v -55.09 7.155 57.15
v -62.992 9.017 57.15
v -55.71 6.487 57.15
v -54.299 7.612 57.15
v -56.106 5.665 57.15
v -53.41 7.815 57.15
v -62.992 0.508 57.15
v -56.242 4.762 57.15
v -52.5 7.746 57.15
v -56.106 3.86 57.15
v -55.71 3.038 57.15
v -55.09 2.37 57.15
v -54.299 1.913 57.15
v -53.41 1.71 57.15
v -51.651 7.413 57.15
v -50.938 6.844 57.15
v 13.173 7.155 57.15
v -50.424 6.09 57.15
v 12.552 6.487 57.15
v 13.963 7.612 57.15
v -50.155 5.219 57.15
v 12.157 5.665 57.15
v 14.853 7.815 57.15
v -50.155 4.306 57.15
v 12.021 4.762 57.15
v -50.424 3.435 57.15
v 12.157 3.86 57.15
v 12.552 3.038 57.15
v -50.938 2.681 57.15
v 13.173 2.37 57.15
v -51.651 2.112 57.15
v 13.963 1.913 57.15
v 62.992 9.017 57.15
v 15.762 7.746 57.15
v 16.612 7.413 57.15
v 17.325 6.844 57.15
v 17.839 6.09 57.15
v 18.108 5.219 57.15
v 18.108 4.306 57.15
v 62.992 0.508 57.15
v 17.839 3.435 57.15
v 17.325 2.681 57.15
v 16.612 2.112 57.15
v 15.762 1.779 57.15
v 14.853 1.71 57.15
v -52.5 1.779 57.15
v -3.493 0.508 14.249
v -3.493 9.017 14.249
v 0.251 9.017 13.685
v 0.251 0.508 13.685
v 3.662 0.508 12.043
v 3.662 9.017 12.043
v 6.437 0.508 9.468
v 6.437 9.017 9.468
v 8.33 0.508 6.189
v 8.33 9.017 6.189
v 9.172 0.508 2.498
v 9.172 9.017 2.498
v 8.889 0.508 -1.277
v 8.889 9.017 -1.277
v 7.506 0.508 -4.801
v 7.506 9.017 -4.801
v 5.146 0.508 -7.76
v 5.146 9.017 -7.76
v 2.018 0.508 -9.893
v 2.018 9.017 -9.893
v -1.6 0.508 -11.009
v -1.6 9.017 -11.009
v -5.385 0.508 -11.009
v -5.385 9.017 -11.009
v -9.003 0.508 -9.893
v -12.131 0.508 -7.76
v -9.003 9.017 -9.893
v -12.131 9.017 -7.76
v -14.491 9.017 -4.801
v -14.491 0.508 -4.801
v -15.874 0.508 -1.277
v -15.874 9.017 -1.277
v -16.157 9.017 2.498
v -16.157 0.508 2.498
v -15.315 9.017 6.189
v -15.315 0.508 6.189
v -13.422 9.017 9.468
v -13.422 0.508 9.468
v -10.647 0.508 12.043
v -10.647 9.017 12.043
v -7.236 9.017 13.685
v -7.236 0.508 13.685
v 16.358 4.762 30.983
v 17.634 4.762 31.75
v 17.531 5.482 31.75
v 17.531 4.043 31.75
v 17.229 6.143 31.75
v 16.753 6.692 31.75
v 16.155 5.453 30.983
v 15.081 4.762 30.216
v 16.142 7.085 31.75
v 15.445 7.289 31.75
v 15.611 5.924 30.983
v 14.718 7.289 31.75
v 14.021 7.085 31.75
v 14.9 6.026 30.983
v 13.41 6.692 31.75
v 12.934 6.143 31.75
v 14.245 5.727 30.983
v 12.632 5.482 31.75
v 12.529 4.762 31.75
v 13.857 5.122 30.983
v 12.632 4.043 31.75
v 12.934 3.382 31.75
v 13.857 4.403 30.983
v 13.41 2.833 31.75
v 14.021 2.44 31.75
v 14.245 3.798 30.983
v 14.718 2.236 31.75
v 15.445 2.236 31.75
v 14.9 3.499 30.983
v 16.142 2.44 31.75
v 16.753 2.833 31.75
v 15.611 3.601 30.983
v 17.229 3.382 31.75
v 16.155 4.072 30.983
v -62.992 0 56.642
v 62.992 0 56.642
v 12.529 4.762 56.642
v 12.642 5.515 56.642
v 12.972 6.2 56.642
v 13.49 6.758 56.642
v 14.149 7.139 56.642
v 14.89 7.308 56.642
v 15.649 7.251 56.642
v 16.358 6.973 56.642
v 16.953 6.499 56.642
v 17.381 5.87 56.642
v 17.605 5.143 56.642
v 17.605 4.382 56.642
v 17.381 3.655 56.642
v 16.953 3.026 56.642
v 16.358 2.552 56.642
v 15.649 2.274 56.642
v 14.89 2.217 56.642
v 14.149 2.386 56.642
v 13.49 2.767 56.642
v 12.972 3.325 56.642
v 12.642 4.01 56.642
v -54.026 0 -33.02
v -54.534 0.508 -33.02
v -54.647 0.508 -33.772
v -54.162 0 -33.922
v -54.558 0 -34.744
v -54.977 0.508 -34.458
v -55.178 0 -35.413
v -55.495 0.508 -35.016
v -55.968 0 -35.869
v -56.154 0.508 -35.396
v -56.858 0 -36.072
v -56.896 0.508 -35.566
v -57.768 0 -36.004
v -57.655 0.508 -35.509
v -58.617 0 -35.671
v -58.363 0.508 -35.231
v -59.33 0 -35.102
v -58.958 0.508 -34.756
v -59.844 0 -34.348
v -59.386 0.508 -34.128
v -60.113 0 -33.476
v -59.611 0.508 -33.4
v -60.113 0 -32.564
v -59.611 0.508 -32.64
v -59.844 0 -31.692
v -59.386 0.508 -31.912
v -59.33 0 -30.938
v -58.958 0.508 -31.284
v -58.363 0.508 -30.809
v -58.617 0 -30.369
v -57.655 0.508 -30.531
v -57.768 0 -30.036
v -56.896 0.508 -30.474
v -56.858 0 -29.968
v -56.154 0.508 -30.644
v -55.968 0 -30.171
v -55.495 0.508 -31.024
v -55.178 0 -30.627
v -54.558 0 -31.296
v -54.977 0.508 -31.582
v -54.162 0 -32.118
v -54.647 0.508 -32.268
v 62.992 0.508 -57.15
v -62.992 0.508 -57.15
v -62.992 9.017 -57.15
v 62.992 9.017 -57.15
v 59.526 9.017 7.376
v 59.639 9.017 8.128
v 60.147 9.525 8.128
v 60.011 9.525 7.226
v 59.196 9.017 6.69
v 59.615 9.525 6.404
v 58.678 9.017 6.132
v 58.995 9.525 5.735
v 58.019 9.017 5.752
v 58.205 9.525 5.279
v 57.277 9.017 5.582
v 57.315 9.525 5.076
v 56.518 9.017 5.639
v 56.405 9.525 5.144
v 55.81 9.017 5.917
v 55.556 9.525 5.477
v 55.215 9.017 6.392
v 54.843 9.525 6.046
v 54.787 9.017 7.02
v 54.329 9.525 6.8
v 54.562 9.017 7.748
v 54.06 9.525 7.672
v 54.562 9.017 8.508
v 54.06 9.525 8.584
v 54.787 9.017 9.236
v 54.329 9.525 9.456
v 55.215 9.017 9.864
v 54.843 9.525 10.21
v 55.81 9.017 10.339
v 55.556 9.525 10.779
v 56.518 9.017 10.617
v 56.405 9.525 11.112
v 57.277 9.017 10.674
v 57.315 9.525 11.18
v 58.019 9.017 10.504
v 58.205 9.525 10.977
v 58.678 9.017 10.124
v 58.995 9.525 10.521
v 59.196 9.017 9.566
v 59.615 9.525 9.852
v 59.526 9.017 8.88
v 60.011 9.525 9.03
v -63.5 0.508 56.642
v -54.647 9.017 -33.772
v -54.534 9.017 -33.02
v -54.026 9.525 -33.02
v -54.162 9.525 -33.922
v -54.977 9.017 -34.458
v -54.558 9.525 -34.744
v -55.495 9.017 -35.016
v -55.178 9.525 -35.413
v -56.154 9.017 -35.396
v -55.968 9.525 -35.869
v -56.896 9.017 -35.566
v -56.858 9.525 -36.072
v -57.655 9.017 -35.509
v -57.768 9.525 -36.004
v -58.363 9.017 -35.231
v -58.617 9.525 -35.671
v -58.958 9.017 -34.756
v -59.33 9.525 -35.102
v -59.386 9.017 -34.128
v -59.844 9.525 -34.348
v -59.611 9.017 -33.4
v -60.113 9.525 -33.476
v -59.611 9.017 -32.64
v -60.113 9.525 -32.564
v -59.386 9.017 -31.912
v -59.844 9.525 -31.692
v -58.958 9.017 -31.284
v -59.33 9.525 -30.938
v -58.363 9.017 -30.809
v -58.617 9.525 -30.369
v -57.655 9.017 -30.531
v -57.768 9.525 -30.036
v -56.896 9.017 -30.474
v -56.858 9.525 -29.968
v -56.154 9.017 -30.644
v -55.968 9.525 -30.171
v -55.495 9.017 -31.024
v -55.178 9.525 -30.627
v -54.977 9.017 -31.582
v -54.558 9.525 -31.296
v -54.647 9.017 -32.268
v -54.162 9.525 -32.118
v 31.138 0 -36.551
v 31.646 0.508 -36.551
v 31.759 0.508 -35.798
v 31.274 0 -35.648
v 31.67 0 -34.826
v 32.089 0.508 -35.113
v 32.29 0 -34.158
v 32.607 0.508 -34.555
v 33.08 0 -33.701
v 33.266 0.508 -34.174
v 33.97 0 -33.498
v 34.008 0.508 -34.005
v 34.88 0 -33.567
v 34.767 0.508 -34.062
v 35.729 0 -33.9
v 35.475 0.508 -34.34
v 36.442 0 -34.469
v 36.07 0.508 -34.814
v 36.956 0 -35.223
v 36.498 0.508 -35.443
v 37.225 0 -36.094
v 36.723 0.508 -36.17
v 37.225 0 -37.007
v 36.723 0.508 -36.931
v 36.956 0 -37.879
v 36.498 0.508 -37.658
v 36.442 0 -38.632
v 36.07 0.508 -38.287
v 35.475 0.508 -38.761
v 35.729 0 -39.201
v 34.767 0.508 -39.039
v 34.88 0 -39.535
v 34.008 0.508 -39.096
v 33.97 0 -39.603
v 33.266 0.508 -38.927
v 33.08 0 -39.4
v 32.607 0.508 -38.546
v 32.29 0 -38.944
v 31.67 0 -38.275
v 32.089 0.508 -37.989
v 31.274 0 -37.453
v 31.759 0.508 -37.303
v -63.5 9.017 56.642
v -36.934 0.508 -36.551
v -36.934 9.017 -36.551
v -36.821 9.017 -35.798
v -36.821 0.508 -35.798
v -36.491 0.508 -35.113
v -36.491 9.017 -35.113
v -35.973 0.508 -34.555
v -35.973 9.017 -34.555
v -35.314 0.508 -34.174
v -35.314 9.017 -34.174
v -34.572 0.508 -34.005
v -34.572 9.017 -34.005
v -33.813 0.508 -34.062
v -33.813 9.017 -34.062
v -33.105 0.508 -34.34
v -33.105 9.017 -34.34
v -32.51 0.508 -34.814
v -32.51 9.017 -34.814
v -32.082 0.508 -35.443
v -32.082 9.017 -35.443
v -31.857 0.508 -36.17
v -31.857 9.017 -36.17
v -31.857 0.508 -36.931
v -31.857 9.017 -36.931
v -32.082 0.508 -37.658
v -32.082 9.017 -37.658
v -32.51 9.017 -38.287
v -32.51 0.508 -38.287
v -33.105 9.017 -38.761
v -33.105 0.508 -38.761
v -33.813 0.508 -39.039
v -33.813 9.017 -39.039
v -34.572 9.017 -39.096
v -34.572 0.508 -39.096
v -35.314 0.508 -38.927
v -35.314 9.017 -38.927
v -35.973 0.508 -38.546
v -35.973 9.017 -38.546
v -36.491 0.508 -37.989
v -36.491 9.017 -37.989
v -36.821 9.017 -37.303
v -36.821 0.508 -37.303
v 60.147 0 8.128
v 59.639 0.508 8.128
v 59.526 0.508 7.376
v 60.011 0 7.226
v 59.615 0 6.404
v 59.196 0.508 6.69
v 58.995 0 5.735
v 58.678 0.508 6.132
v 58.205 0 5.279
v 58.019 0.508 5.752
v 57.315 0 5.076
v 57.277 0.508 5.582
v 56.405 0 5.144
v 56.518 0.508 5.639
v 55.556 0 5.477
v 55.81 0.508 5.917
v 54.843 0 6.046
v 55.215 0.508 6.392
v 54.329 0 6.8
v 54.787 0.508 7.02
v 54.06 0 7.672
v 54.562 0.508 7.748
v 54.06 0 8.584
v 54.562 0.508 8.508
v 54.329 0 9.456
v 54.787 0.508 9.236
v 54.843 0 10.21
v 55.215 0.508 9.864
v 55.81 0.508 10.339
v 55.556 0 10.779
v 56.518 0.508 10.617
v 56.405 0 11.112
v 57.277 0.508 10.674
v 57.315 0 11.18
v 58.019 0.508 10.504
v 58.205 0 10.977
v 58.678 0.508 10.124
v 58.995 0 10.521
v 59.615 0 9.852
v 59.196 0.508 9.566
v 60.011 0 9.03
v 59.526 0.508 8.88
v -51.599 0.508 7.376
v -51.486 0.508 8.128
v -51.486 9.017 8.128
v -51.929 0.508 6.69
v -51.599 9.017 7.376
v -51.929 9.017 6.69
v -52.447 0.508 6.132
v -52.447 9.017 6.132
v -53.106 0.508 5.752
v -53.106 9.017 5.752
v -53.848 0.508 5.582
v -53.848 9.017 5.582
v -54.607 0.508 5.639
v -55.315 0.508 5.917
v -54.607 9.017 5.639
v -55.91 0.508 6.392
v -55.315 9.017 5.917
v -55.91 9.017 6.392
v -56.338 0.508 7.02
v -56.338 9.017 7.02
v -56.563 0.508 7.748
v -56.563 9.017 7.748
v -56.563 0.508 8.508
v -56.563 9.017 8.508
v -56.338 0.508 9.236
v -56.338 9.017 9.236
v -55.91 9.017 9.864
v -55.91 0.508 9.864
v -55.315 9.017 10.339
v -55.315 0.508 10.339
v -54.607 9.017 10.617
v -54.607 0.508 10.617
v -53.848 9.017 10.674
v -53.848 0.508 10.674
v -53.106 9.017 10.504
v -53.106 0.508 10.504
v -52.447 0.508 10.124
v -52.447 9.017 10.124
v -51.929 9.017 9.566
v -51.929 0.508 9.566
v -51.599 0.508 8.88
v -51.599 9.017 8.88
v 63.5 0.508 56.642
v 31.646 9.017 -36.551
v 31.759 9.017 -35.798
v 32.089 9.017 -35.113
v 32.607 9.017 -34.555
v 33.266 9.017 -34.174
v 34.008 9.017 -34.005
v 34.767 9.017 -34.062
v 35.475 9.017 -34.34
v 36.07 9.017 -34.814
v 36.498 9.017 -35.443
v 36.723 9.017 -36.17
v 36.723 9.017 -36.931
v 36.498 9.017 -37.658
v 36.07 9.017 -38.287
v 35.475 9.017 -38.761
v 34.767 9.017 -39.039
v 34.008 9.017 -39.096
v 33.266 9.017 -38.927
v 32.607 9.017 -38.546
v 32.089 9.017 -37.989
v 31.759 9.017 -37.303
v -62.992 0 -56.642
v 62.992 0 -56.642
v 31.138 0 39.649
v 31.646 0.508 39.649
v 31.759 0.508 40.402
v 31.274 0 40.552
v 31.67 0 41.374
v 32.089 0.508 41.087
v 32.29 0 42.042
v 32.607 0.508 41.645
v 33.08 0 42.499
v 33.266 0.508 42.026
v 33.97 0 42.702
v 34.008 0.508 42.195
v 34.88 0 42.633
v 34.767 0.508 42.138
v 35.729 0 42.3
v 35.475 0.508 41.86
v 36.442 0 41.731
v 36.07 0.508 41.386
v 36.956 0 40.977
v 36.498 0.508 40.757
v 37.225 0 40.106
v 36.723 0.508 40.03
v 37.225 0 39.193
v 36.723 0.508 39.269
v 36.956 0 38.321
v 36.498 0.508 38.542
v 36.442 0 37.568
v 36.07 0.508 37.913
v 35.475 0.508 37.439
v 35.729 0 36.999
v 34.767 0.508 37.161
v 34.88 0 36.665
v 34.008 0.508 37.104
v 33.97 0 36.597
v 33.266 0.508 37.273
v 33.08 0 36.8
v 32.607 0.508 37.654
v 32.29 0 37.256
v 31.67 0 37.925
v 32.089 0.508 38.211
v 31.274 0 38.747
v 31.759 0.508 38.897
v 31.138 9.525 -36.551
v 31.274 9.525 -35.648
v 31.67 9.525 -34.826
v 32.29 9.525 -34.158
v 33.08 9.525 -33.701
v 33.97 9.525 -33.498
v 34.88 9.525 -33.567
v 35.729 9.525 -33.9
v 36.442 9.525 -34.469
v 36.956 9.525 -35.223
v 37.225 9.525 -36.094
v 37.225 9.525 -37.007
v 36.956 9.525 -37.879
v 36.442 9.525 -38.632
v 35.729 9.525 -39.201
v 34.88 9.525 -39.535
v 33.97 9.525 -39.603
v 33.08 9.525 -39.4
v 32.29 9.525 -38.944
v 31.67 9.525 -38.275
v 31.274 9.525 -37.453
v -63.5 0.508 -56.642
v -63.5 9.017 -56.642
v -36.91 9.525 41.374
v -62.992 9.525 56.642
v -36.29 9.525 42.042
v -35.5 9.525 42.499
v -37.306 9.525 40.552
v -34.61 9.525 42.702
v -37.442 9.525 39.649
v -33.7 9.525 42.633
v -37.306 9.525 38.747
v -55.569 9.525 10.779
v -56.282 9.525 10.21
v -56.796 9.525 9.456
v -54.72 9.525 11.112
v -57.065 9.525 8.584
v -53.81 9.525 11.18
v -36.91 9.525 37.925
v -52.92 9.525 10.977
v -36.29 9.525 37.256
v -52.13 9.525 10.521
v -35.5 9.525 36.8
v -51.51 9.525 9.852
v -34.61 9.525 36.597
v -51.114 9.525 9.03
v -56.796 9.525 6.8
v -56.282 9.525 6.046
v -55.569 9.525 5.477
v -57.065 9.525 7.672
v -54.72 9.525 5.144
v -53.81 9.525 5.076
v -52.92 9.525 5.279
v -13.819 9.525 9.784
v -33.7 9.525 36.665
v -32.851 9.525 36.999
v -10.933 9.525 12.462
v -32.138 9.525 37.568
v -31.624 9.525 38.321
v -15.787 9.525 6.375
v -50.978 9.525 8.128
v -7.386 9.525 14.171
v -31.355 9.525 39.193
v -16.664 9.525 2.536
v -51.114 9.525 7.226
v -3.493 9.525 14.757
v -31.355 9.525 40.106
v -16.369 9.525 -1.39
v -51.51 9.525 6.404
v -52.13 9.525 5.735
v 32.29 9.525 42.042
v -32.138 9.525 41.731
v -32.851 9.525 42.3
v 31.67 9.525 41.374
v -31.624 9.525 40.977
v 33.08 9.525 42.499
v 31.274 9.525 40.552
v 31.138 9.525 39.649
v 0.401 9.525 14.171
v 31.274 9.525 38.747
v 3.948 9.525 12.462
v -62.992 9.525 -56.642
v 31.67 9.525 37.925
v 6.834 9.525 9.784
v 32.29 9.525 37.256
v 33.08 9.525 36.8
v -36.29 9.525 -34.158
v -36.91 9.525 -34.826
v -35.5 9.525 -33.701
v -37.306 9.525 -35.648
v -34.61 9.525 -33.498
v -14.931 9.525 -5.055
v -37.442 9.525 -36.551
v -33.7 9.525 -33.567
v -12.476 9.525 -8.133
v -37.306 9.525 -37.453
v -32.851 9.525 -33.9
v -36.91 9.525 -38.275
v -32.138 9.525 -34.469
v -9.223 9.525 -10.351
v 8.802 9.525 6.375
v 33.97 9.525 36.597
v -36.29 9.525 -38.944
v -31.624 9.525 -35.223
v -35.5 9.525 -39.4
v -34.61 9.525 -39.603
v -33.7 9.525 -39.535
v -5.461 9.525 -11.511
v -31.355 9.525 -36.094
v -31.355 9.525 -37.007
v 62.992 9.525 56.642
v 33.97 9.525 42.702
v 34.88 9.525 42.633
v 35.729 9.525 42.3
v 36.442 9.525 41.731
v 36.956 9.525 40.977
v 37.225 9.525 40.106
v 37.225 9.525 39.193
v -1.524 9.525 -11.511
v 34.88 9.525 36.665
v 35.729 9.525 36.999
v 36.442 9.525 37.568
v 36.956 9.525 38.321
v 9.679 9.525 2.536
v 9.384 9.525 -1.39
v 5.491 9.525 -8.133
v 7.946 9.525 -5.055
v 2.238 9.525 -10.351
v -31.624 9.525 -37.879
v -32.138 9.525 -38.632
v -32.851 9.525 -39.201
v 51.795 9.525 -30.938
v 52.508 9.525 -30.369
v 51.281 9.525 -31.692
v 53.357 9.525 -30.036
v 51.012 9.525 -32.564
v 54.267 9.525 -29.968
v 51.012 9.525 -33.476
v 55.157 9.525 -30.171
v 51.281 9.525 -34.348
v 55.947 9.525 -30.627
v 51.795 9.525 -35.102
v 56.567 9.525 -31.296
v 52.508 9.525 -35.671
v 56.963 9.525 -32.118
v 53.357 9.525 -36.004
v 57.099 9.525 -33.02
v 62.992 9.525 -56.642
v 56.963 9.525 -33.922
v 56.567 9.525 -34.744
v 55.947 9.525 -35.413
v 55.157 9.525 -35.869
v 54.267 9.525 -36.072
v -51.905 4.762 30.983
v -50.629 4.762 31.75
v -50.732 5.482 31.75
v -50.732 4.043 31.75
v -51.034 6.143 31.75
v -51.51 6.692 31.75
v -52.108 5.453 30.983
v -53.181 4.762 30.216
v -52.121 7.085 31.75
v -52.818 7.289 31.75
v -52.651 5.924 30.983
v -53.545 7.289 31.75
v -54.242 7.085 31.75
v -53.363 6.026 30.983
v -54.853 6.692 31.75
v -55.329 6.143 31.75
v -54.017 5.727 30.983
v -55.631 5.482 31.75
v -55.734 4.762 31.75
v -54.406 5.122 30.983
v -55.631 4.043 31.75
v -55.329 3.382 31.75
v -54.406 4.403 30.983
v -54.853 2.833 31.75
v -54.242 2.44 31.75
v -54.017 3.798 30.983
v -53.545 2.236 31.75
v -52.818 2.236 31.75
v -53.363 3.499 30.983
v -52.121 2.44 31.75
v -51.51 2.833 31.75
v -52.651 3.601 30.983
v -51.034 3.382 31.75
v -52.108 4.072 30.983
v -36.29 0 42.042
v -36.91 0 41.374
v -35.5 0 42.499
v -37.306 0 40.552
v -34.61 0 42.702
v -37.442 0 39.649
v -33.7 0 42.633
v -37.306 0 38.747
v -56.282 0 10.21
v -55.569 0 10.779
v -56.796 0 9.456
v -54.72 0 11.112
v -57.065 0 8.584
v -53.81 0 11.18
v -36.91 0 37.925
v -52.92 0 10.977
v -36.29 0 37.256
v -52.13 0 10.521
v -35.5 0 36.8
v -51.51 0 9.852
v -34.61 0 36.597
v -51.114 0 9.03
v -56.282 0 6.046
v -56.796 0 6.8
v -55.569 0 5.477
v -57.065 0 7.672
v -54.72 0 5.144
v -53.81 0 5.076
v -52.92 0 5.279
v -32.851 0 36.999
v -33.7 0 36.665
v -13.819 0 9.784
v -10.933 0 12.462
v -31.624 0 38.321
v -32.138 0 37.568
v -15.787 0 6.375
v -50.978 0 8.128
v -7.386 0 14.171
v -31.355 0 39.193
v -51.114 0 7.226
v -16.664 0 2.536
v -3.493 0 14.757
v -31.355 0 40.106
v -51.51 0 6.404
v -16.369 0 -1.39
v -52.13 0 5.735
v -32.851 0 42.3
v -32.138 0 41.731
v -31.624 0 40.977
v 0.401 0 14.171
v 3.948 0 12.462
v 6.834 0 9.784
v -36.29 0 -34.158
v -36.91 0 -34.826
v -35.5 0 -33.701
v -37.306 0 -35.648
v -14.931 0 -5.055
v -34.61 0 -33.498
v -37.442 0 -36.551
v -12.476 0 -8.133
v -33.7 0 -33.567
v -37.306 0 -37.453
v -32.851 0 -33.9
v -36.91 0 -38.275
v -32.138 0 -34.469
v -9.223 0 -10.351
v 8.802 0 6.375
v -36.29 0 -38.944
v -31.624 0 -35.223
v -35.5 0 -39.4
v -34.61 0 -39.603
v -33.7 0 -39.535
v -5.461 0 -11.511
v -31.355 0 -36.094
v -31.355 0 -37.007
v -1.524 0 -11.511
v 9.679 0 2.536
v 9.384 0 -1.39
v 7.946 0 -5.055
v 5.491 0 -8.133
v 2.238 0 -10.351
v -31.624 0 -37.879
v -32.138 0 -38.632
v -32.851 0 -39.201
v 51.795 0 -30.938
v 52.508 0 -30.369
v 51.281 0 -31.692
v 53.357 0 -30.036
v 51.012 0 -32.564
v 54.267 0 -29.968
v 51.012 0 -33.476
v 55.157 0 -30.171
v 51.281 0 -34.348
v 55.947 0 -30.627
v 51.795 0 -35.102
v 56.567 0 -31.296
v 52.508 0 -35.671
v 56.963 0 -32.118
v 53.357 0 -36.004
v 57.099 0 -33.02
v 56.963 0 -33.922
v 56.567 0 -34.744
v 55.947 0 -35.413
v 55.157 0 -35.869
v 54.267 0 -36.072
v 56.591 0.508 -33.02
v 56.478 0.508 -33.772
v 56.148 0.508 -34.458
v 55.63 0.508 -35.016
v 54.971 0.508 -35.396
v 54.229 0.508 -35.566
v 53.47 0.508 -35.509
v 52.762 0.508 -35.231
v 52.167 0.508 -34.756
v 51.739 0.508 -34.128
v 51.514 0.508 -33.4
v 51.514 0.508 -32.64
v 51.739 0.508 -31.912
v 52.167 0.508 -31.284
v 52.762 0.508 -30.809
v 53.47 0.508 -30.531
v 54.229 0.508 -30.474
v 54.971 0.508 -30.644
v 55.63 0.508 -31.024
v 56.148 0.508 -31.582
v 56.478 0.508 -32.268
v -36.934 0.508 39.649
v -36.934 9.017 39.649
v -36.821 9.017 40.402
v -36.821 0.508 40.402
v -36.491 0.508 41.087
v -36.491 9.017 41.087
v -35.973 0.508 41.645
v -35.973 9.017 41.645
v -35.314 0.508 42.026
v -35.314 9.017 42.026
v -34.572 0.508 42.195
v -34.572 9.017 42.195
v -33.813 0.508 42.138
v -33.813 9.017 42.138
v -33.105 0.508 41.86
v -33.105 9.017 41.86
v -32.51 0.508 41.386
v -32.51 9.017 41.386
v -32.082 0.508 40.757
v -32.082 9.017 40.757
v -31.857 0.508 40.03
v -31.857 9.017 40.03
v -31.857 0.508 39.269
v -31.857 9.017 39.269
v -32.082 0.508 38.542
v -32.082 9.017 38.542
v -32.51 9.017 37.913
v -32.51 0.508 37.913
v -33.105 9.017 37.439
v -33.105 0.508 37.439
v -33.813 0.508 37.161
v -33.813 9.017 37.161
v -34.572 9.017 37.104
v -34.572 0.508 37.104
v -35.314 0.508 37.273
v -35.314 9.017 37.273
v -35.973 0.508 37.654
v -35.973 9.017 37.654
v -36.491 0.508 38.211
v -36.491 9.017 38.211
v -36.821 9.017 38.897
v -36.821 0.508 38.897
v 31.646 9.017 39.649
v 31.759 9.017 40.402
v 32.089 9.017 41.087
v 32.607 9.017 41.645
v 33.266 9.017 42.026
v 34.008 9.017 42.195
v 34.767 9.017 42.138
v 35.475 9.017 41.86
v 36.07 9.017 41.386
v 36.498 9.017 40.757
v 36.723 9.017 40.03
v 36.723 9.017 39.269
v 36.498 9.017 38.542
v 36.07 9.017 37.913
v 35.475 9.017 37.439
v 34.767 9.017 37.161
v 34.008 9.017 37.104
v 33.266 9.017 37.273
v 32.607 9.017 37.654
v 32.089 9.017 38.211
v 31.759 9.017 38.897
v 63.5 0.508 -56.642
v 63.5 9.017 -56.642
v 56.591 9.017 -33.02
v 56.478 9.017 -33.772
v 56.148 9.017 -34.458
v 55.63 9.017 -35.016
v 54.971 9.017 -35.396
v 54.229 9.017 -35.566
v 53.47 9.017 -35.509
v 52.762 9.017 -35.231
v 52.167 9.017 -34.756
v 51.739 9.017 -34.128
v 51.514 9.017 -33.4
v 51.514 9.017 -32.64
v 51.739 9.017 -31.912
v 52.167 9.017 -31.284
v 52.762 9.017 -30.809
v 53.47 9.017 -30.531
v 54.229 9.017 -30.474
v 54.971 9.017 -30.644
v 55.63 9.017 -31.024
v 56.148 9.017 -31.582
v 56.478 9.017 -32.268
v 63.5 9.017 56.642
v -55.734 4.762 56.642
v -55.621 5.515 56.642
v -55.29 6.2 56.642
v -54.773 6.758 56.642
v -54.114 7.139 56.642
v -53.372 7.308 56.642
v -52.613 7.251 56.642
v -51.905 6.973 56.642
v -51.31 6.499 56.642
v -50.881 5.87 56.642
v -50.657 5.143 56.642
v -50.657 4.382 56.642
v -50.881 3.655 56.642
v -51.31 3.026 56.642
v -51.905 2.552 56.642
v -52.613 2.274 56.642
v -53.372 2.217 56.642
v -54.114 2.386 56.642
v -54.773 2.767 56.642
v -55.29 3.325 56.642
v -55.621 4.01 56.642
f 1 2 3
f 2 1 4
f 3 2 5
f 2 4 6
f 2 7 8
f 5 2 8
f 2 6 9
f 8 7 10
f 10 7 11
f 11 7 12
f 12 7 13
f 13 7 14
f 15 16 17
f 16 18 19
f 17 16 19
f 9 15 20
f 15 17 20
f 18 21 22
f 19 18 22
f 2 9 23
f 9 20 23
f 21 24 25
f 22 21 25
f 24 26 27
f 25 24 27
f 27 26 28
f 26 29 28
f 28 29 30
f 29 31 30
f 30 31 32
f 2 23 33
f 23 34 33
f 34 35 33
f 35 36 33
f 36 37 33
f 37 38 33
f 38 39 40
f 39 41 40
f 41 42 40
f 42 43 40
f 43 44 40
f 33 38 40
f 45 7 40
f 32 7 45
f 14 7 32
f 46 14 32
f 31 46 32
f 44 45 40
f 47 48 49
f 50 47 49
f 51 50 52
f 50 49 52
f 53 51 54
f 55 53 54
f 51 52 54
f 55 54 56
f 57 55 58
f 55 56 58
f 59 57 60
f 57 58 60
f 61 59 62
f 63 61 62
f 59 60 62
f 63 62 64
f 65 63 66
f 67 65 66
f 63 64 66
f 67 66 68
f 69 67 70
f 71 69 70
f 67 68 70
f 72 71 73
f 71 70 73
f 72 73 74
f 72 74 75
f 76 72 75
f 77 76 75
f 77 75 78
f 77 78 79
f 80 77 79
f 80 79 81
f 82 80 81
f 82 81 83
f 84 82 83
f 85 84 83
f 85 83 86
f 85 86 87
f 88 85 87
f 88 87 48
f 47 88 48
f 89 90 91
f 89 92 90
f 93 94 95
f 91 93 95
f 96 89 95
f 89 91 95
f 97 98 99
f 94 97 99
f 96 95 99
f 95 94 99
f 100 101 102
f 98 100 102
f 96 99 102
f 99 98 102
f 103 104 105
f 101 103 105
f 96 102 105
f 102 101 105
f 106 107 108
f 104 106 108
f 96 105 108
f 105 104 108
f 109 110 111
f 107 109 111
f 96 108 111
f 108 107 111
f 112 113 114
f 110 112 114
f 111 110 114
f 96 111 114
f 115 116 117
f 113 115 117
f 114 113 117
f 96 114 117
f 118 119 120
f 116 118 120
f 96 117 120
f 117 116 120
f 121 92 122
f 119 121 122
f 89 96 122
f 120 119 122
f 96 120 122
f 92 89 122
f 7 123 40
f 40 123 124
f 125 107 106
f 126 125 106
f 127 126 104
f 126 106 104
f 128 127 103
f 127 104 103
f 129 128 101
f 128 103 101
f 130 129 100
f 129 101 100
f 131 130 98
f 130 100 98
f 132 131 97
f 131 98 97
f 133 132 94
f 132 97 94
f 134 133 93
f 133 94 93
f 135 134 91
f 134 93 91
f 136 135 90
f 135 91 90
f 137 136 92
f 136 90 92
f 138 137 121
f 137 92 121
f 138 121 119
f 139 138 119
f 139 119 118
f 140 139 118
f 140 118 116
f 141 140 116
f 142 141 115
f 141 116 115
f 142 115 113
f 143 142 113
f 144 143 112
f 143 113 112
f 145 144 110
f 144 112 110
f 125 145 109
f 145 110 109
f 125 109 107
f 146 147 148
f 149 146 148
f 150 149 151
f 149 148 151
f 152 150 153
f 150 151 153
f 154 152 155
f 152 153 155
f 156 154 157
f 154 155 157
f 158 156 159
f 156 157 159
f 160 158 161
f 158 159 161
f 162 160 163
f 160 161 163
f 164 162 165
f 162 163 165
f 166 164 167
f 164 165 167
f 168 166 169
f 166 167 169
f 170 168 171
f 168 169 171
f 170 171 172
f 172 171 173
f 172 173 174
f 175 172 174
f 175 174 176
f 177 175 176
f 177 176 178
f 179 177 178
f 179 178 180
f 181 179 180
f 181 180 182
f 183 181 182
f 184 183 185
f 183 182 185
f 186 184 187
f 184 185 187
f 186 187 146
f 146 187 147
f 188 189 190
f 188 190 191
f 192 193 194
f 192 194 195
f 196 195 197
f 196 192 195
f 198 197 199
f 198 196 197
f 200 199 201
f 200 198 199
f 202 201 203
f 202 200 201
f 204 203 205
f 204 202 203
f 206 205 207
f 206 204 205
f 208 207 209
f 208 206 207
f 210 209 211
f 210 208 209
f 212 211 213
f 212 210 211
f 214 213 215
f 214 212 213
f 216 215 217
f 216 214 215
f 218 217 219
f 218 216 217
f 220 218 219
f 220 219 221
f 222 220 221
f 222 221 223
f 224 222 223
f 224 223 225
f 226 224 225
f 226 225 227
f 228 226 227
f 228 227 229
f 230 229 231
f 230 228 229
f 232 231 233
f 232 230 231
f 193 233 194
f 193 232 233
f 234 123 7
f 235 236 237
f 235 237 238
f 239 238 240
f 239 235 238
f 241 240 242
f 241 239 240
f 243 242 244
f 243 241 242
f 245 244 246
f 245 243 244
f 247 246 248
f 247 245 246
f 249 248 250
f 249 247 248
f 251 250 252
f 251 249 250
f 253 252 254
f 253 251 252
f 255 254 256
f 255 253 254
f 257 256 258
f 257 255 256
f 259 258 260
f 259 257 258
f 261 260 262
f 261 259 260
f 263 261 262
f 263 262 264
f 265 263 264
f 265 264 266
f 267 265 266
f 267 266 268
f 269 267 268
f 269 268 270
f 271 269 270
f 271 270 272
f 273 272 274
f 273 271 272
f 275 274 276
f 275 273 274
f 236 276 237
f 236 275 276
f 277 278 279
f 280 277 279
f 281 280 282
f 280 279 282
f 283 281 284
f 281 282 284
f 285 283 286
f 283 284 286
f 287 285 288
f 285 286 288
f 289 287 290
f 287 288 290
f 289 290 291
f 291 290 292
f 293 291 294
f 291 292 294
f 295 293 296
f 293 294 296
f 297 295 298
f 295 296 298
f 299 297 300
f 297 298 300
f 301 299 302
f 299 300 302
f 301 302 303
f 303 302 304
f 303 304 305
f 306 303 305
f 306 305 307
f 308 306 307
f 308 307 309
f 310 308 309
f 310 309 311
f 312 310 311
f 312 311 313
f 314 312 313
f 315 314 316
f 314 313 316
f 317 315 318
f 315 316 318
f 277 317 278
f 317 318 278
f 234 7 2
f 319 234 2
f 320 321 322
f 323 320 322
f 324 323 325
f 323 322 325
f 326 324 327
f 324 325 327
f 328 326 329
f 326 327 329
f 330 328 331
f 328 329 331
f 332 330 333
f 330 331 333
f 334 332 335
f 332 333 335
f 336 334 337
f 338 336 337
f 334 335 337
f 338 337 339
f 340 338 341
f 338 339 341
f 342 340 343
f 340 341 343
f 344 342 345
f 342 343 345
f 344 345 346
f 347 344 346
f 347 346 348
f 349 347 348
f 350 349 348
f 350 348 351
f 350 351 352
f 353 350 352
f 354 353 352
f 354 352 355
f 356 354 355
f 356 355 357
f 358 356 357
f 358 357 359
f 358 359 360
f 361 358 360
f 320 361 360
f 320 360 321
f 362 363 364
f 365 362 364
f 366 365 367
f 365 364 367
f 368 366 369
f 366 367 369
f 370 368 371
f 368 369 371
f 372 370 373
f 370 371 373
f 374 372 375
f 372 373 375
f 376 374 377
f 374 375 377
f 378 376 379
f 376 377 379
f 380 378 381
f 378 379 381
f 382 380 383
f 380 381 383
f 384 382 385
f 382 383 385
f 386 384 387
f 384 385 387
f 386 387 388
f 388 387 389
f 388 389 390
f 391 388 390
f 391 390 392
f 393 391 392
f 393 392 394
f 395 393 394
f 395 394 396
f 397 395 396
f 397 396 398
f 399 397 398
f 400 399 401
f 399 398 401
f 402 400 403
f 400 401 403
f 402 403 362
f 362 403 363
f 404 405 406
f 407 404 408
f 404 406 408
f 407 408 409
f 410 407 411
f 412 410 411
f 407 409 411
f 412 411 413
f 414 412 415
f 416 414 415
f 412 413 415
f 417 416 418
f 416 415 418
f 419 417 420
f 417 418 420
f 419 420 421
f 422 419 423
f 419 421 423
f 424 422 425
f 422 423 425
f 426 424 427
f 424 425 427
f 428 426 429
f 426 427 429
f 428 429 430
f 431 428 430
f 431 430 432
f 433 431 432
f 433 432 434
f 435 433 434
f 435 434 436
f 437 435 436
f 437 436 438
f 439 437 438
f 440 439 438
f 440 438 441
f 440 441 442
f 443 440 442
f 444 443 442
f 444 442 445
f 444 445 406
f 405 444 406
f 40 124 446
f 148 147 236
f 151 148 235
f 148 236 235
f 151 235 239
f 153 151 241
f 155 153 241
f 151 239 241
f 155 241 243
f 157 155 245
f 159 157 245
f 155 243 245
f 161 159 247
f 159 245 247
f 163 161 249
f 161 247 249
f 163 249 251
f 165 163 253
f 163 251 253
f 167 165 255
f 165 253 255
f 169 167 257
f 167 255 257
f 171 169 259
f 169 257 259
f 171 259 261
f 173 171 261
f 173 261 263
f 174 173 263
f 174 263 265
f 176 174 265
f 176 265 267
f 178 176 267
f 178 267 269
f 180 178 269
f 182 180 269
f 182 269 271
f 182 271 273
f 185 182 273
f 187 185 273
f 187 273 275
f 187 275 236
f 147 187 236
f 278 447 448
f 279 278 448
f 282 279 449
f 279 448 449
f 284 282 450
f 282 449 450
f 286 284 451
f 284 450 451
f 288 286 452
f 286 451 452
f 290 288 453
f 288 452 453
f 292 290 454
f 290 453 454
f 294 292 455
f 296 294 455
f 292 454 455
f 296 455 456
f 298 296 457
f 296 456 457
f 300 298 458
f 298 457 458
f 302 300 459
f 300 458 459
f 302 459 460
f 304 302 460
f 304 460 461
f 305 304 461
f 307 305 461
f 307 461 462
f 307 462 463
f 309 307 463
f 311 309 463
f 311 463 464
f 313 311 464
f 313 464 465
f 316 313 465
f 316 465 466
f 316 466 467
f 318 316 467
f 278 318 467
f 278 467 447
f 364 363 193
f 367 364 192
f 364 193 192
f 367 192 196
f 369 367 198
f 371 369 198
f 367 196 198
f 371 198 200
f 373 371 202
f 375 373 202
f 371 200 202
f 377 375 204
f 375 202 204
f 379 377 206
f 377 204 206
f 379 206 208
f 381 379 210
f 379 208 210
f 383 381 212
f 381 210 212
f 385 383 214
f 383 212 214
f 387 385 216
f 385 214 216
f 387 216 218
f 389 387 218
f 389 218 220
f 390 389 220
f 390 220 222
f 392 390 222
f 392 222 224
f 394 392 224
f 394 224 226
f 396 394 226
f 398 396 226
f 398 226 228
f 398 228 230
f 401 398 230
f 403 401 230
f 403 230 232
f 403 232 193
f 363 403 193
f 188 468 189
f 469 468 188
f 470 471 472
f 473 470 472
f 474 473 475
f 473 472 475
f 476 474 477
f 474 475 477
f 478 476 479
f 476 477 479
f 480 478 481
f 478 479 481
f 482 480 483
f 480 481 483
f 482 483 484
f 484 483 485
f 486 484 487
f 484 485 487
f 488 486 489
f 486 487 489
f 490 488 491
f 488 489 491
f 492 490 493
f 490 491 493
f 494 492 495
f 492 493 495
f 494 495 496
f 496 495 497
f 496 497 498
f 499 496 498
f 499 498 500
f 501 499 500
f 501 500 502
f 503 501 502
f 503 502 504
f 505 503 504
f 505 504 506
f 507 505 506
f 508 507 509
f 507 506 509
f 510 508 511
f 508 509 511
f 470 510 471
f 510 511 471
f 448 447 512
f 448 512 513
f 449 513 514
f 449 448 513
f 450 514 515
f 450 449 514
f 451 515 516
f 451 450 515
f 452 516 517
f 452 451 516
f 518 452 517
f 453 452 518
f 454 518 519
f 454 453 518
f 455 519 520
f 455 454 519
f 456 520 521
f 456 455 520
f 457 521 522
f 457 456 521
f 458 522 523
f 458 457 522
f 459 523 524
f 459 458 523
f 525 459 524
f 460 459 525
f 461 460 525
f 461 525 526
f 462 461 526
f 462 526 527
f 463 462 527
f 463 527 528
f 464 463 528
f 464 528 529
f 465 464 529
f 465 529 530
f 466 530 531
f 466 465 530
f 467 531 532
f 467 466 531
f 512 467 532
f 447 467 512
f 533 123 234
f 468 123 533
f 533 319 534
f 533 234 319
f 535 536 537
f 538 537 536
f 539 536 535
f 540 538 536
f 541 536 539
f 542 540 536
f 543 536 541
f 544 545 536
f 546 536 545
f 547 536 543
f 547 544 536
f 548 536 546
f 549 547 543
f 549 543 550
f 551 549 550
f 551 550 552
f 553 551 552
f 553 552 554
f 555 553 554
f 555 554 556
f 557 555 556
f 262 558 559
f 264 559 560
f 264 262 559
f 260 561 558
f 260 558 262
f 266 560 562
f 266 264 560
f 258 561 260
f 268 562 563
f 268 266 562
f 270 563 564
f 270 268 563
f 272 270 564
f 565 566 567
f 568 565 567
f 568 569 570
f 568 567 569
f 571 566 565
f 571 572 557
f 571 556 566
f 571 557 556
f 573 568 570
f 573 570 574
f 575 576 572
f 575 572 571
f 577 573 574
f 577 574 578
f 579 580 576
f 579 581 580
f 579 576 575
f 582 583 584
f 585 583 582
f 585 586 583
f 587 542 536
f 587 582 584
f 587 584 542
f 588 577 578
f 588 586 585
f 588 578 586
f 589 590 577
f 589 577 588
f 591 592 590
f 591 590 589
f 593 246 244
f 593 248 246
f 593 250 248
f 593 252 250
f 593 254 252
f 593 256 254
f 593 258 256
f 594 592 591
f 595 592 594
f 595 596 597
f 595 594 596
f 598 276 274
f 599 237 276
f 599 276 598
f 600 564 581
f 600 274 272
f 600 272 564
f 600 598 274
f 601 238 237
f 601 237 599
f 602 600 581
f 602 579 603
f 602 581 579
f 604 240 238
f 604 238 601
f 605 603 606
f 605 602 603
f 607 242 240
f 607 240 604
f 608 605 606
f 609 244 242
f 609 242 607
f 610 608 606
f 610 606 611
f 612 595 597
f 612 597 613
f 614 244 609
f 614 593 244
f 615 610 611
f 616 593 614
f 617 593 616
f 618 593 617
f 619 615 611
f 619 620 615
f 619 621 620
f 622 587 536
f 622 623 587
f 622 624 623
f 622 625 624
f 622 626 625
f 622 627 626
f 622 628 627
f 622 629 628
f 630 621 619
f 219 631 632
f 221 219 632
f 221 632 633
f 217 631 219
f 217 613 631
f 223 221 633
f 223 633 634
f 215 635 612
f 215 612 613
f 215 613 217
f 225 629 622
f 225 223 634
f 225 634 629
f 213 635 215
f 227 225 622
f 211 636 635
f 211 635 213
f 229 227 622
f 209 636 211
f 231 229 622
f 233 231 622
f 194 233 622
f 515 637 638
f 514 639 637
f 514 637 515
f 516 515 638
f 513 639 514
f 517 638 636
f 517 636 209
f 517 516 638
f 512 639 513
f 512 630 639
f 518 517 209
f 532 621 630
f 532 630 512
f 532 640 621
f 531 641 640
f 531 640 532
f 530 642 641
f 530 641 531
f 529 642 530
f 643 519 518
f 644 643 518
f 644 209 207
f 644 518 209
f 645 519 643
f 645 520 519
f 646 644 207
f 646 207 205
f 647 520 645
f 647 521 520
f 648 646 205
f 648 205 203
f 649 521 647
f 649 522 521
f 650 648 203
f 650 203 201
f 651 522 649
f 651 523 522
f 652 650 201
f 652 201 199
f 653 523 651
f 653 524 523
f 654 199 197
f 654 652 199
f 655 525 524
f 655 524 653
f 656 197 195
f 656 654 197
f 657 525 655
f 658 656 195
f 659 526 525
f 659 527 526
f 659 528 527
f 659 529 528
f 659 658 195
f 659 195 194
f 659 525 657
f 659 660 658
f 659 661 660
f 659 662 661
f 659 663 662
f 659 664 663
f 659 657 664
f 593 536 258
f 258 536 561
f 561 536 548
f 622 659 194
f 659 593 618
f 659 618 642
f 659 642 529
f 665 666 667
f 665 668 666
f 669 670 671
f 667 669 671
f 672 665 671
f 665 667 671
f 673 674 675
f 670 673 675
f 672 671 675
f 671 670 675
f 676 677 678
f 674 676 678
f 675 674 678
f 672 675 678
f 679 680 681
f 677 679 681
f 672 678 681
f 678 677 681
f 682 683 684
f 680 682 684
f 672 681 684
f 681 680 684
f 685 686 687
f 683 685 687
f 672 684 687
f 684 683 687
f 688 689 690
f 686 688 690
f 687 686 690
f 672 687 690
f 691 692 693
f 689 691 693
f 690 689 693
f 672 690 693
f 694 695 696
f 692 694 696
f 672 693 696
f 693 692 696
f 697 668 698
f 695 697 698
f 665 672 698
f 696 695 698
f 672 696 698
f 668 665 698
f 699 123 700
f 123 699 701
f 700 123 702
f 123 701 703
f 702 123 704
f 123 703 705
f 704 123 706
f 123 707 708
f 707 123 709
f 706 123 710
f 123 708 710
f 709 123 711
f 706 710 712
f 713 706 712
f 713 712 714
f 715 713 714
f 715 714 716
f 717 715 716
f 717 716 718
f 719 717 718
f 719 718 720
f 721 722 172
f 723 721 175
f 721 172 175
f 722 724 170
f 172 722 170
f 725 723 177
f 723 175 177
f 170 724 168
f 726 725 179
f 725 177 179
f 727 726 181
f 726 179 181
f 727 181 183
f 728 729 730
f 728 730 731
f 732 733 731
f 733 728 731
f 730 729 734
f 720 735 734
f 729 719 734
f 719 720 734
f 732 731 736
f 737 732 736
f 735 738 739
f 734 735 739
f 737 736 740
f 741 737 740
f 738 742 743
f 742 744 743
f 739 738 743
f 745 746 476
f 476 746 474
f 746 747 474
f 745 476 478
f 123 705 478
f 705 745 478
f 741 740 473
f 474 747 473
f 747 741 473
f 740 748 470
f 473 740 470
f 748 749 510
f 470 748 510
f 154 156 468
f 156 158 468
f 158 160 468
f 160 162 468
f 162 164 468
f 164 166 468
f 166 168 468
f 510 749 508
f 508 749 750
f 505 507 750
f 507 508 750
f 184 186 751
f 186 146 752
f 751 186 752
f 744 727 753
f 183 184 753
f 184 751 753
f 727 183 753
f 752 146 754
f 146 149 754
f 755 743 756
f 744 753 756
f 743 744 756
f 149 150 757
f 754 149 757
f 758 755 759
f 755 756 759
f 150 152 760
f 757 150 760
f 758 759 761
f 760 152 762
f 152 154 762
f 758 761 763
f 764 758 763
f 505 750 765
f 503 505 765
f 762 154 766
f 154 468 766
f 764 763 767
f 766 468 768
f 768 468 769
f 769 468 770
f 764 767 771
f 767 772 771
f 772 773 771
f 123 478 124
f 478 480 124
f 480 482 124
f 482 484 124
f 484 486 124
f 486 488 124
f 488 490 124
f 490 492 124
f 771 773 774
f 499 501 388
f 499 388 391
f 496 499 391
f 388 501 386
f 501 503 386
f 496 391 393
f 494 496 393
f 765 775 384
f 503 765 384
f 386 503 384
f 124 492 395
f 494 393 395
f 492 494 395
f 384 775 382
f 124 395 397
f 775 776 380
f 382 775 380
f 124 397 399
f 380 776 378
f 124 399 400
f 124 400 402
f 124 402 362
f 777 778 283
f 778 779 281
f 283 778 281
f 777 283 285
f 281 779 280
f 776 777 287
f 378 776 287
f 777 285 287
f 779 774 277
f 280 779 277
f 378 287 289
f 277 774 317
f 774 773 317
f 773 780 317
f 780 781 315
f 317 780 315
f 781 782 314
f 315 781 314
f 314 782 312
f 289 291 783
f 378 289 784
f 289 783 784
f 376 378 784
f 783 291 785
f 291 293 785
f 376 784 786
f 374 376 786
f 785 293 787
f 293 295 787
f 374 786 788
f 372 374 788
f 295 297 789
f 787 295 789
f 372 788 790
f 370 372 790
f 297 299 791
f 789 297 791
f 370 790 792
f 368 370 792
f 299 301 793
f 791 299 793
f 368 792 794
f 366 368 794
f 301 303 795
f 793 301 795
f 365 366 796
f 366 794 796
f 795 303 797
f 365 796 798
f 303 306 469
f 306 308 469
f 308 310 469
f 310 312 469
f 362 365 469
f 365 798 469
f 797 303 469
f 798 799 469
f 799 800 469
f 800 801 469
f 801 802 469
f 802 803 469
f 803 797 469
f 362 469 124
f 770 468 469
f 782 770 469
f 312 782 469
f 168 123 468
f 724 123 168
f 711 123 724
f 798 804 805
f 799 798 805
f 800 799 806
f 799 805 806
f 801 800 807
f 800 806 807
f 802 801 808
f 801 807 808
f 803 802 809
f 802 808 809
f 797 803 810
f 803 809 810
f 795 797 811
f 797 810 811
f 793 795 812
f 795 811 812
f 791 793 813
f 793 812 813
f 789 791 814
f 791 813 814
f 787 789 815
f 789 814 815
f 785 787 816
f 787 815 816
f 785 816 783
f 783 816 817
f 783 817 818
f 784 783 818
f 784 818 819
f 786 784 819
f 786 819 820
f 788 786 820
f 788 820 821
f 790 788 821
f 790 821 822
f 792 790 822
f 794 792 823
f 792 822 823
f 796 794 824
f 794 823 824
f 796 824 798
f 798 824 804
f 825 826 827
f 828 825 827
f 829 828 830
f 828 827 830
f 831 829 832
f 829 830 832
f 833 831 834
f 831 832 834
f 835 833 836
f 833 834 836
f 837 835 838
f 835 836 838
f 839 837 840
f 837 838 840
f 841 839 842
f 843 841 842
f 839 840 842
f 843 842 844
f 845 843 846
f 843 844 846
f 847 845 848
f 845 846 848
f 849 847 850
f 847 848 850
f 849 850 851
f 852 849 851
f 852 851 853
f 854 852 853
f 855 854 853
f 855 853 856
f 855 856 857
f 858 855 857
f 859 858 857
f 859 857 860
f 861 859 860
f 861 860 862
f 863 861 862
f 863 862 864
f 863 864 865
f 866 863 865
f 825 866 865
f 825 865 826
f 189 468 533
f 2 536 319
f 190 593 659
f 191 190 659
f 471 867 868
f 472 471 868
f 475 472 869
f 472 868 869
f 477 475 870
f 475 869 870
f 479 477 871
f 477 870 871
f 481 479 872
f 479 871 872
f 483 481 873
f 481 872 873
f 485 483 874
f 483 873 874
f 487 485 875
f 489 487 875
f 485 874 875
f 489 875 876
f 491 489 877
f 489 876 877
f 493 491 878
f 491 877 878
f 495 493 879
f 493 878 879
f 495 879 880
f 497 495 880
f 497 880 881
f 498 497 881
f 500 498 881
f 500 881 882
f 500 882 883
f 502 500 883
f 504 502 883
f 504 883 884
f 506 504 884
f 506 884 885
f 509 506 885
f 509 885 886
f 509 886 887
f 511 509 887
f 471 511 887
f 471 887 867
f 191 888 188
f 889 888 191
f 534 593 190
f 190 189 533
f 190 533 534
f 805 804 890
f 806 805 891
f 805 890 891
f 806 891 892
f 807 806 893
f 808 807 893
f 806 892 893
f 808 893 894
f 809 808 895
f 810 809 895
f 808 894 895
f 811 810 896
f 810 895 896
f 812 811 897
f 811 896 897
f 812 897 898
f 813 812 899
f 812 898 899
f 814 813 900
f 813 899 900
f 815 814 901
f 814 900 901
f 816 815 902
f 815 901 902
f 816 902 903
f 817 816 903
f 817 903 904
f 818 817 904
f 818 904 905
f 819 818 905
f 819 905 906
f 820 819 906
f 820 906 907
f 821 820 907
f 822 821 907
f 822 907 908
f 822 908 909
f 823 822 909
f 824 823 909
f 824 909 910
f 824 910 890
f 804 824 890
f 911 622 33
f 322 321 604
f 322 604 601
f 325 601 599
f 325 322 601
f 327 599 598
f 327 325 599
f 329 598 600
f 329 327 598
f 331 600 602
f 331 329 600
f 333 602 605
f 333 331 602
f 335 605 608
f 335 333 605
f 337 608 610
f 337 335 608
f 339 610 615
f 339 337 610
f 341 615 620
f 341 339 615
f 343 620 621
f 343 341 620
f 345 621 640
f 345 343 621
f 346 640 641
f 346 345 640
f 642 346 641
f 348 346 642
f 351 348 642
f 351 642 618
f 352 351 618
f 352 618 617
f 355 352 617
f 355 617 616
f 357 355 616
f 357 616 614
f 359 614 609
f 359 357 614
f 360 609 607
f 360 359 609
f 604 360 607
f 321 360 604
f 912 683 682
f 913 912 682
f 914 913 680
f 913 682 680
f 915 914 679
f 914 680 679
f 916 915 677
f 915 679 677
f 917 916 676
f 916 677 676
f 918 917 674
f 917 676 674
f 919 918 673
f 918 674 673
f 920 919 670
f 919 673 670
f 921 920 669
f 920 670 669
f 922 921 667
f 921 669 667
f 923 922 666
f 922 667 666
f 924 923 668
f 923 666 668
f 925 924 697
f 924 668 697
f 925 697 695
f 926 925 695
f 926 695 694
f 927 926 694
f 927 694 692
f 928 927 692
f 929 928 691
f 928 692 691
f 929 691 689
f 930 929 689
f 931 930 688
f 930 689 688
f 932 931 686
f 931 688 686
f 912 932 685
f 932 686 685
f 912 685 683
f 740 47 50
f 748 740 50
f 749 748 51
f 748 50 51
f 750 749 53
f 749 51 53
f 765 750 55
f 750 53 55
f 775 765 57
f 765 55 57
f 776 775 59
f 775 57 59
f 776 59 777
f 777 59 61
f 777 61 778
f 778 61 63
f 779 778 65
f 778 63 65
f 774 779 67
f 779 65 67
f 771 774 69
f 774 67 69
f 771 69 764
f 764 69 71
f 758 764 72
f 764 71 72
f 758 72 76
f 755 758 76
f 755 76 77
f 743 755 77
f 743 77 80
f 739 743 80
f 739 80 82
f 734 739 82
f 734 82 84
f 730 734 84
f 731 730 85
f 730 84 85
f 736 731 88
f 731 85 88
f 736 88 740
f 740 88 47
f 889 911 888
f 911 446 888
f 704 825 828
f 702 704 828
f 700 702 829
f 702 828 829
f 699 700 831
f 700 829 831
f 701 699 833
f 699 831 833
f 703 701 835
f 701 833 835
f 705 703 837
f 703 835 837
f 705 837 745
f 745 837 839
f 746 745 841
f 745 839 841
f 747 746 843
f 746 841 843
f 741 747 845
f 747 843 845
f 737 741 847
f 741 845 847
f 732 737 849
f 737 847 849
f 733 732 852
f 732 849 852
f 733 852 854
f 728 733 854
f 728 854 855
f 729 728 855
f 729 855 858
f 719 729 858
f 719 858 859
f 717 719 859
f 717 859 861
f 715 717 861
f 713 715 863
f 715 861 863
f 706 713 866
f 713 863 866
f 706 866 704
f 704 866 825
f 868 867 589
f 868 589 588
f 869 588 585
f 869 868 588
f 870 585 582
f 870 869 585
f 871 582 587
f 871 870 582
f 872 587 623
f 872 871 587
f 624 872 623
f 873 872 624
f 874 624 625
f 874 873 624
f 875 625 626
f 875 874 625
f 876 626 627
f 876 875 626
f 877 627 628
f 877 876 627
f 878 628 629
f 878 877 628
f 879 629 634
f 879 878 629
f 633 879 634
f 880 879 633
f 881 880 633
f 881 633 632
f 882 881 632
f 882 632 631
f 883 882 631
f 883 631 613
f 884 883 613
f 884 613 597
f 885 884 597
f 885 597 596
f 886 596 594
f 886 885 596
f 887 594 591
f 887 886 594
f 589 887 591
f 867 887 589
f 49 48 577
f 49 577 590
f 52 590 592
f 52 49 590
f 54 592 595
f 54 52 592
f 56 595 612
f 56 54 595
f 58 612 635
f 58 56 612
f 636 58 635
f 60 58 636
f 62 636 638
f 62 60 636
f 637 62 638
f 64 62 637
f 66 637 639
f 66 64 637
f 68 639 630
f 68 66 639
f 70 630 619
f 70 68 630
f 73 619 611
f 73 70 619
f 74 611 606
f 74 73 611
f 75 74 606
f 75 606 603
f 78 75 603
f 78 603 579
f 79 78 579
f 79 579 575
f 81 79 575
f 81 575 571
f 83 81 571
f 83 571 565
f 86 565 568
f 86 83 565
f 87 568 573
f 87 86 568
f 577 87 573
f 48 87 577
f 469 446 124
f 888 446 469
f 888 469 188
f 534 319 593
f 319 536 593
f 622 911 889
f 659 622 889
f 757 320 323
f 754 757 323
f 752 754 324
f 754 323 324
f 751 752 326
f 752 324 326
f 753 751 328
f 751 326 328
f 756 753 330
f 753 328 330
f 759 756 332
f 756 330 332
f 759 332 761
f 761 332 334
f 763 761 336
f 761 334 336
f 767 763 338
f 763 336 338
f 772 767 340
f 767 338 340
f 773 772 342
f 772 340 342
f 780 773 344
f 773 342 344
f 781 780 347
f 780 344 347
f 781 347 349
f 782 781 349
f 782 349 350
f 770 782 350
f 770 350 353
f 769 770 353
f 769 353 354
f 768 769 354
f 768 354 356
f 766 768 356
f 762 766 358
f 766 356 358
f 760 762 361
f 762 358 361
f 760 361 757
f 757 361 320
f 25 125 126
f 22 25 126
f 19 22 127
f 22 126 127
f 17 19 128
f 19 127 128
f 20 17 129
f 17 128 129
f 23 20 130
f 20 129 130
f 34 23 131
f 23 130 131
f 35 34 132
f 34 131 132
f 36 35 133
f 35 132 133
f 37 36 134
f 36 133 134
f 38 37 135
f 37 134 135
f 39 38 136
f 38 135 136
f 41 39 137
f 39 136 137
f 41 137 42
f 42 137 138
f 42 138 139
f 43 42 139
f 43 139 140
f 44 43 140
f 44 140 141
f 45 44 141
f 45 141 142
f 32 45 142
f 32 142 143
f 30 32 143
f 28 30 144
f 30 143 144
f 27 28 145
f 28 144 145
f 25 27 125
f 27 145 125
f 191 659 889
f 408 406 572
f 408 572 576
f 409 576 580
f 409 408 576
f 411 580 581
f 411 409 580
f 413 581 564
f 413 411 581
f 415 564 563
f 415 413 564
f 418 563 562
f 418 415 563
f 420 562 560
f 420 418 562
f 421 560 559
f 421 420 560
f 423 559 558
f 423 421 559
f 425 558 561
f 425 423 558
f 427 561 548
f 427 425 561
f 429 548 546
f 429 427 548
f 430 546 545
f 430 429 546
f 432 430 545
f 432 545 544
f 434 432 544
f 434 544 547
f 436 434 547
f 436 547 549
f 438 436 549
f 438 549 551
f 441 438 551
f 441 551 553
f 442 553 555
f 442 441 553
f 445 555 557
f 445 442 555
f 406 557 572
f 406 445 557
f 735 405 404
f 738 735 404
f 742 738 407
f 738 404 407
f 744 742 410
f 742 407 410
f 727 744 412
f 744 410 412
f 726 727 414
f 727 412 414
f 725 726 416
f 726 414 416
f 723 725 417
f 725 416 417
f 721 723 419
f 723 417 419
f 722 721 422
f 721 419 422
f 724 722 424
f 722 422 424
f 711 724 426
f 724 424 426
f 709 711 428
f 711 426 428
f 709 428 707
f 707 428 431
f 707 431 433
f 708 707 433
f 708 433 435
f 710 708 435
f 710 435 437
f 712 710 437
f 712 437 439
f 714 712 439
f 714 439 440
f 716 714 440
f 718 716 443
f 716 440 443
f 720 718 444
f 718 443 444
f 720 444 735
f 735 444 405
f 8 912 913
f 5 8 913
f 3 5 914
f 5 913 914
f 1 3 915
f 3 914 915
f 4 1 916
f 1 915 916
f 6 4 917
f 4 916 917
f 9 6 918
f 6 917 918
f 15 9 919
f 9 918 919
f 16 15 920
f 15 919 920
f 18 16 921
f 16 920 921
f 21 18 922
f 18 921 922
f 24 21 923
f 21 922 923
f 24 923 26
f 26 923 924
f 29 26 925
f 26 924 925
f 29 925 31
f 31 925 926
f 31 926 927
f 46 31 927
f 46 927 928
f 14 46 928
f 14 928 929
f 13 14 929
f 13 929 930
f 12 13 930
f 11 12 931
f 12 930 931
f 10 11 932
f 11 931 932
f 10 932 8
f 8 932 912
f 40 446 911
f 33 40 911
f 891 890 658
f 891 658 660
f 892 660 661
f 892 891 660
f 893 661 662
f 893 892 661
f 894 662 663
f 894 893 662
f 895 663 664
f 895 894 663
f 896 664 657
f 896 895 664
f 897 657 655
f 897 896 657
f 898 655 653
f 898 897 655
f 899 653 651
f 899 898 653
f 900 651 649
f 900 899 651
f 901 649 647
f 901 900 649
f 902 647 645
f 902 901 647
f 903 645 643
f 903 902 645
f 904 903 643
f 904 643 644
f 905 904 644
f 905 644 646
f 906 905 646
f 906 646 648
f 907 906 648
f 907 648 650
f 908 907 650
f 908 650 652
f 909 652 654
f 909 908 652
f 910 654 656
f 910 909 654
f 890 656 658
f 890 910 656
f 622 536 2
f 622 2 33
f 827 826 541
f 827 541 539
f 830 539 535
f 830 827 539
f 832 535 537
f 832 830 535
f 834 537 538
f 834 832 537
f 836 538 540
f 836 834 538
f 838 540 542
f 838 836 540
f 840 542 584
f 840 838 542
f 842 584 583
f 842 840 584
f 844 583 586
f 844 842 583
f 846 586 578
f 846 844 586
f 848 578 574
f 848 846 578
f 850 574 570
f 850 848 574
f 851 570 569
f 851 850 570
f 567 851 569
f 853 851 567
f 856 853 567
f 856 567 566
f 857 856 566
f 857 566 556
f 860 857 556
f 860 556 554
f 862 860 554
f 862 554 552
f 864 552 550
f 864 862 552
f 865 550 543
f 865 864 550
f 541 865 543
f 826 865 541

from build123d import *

# Parameters (mm, degrees)
SKETCH1_W                             = 127
SKETCH1_H                             = 114.3
BOSS_EXTRUDE1_DEPTH                   = 9.525
SKETCH2_R                             = 12.7
CUT_EXTRUDE1_DEPTH                    = 86.959863454
F_10_CLEARANCE_HOLE2_D                = 5.1054
F_10_CLEARANCE_HOLE2_DEPTH            = 38.1
F_10_CLEARANCE_HOLE2_TIP              = 1.533816902
F_10_CLEARANCE_HOLE3_D                = 5.1054
TAPPED_HOLE_FOR_10_32_HELICOIL1_D     = 5.1054
TAPPED_HOLE_FOR_10_32_HELICOIL1_DEPTH = 25.4
TAPPED_HOLE_FOR_10_32_HELICOIL1_TIP   = 1.533816902
CHAMFER1_SIZE                         = 0.508


with BuildPart() as part:
    # Sketch1 → Boss-Extrude1 (new body)
    with BuildSketch(Plane(origin=(0, 0, 0), x_dir=(1, 0, 0), z_dir=(0, 1, 0))):
        Rectangle(SKETCH1_W, SKETCH1_H)
    extrude(amount=BOSS_EXTRUDE1_DEPTH)

    # Sketch2 → Cut-Extrude1 (cut, through all)
    with BuildSketch(Plane(origin=(0, 9.525, 0), x_dir=(1, 0, 0), z_dir=(0, 1, 0))):
        with Locations(Location((-3.4925, -1.5494, 0), (0, 0, 270))):
            Circle(SKETCH2_R)
    extrude(amount=-CUT_EXTRUDE1_DEPTH, mode=Mode.SUBTRACT)

    # #10 Clearance Hole2
    with Locations(Plane(origin=(1.014314116, 0, 37.659468055), x_dir=(1, 0, 0), z_dir=(0, -1, 0))):
        with Locations((-35.395754116, -74.210068055), (33.184245884, 1.989931945), (-35.395754116, 1.989931945), (33.184245884, -74.210068055)):
            Hole(F_10_CLEARANCE_HOLE2_D / 2, depth=F_10_CLEARANCE_HOLE2_DEPTH)
            with Locations((0, 0, -(F_10_CLEARANCE_HOLE2_DEPTH + F_10_CLEARANCE_HOLE2_TIP / 2))):  # 118° drill point
                Cone(0, F_10_CLEARANCE_HOLE2_D / 2, F_10_CLEARANCE_HOLE2_TIP, mode=Mode.SUBTRACT)

    # #10 Clearance Hole3 (through all)
    with Locations(Plane(origin=(0, 0, 0), x_dir=(-1, 0, 0), z_dir=(0, -1, 0))):
        with Locations((-54.0385, 33.02), (-57.0865, -8.128), (57.0865, 33.02), (54.0385, -8.128)):
            Hole(F_10_CLEARANCE_HOLE3_D / 2)

    # Tapped Hole for #10-32 Helicoil1
    with Locations(Plane.XY.offset(57.15)):
        with Locations((-53.18125, 4.7625), (15.08125, 4.7625)):
            Hole(TAPPED_HOLE_FOR_10_32_HELICOIL1_D / 2, depth=TAPPED_HOLE_FOR_10_32_HELICOIL1_DEPTH)
            with Locations((0, 0, -(TAPPED_HOLE_FOR_10_32_HELICOIL1_DEPTH + TAPPED_HOLE_FOR_10_32_HELICOIL1_TIP / 2))):  # 118° drill point
                Cone(0, TAPPED_HOLE_FOR_10_32_HELICOIL1_D / 2, TAPPED_HOLE_FOR_10_32_HELICOIL1_TIP, mode=Mode.SUBTRACT)

    # Chamfer1
    chamfer1_edges = [part.edges().sort_by_distance(p)[0] for p in [
        (-63.5, 9.525, 0),
        (0, 9.525, 57.15),
        (-3.4925, 0, -11.1506),
        (-3.4925, 9.525, -11.1506),
        (36.75126, 9.525, -36.5506),
        (36.75126, 0, -36.5506),
        (-31.82874, 9.525, 39.6494),
        (-31.82874, 0, 39.6494),
        (36.75126, 9.525, 39.6494),
        (36.75126, 0, 39.6494),
        (-31.82874, 9.525, -36.5506),
        (-31.82874, 0, -36.5506),
        (63.5, 9.525, 0),
        (-56.5912, 0, 8.128),
        (-56.5912, 9.525, 8.128),
        (0, 0, 57.15),
        (-59.6392, 0, -33.02),
        (-59.6392, 9.525, -33.02),
        (-63.5, 0, 0),
        (0, 0, -57.15),
        (54.5338, 0, 8.128),
        (54.5338, 9.525, 8.128),
        (63.5, 0, 0),
        (51.4858, 0, -33.02),
        (51.4858, 9.525, -33.02),
        (17.63395, 4.7625, 57.15),
        (-50.62855, 4.7625, 57.15),
        (0, 9.525, -57.15),
        (63.5, 4.7625, 57.15),
        (-63.5, 4.7625, 57.15),
        (-63.5, 4.7625, -57.15),
        (63.5, 4.7625, -57.15),
    ]]
    chamfer(chamfer1_edges, length=CHAMFER1_SIZE)


solid = part.part
